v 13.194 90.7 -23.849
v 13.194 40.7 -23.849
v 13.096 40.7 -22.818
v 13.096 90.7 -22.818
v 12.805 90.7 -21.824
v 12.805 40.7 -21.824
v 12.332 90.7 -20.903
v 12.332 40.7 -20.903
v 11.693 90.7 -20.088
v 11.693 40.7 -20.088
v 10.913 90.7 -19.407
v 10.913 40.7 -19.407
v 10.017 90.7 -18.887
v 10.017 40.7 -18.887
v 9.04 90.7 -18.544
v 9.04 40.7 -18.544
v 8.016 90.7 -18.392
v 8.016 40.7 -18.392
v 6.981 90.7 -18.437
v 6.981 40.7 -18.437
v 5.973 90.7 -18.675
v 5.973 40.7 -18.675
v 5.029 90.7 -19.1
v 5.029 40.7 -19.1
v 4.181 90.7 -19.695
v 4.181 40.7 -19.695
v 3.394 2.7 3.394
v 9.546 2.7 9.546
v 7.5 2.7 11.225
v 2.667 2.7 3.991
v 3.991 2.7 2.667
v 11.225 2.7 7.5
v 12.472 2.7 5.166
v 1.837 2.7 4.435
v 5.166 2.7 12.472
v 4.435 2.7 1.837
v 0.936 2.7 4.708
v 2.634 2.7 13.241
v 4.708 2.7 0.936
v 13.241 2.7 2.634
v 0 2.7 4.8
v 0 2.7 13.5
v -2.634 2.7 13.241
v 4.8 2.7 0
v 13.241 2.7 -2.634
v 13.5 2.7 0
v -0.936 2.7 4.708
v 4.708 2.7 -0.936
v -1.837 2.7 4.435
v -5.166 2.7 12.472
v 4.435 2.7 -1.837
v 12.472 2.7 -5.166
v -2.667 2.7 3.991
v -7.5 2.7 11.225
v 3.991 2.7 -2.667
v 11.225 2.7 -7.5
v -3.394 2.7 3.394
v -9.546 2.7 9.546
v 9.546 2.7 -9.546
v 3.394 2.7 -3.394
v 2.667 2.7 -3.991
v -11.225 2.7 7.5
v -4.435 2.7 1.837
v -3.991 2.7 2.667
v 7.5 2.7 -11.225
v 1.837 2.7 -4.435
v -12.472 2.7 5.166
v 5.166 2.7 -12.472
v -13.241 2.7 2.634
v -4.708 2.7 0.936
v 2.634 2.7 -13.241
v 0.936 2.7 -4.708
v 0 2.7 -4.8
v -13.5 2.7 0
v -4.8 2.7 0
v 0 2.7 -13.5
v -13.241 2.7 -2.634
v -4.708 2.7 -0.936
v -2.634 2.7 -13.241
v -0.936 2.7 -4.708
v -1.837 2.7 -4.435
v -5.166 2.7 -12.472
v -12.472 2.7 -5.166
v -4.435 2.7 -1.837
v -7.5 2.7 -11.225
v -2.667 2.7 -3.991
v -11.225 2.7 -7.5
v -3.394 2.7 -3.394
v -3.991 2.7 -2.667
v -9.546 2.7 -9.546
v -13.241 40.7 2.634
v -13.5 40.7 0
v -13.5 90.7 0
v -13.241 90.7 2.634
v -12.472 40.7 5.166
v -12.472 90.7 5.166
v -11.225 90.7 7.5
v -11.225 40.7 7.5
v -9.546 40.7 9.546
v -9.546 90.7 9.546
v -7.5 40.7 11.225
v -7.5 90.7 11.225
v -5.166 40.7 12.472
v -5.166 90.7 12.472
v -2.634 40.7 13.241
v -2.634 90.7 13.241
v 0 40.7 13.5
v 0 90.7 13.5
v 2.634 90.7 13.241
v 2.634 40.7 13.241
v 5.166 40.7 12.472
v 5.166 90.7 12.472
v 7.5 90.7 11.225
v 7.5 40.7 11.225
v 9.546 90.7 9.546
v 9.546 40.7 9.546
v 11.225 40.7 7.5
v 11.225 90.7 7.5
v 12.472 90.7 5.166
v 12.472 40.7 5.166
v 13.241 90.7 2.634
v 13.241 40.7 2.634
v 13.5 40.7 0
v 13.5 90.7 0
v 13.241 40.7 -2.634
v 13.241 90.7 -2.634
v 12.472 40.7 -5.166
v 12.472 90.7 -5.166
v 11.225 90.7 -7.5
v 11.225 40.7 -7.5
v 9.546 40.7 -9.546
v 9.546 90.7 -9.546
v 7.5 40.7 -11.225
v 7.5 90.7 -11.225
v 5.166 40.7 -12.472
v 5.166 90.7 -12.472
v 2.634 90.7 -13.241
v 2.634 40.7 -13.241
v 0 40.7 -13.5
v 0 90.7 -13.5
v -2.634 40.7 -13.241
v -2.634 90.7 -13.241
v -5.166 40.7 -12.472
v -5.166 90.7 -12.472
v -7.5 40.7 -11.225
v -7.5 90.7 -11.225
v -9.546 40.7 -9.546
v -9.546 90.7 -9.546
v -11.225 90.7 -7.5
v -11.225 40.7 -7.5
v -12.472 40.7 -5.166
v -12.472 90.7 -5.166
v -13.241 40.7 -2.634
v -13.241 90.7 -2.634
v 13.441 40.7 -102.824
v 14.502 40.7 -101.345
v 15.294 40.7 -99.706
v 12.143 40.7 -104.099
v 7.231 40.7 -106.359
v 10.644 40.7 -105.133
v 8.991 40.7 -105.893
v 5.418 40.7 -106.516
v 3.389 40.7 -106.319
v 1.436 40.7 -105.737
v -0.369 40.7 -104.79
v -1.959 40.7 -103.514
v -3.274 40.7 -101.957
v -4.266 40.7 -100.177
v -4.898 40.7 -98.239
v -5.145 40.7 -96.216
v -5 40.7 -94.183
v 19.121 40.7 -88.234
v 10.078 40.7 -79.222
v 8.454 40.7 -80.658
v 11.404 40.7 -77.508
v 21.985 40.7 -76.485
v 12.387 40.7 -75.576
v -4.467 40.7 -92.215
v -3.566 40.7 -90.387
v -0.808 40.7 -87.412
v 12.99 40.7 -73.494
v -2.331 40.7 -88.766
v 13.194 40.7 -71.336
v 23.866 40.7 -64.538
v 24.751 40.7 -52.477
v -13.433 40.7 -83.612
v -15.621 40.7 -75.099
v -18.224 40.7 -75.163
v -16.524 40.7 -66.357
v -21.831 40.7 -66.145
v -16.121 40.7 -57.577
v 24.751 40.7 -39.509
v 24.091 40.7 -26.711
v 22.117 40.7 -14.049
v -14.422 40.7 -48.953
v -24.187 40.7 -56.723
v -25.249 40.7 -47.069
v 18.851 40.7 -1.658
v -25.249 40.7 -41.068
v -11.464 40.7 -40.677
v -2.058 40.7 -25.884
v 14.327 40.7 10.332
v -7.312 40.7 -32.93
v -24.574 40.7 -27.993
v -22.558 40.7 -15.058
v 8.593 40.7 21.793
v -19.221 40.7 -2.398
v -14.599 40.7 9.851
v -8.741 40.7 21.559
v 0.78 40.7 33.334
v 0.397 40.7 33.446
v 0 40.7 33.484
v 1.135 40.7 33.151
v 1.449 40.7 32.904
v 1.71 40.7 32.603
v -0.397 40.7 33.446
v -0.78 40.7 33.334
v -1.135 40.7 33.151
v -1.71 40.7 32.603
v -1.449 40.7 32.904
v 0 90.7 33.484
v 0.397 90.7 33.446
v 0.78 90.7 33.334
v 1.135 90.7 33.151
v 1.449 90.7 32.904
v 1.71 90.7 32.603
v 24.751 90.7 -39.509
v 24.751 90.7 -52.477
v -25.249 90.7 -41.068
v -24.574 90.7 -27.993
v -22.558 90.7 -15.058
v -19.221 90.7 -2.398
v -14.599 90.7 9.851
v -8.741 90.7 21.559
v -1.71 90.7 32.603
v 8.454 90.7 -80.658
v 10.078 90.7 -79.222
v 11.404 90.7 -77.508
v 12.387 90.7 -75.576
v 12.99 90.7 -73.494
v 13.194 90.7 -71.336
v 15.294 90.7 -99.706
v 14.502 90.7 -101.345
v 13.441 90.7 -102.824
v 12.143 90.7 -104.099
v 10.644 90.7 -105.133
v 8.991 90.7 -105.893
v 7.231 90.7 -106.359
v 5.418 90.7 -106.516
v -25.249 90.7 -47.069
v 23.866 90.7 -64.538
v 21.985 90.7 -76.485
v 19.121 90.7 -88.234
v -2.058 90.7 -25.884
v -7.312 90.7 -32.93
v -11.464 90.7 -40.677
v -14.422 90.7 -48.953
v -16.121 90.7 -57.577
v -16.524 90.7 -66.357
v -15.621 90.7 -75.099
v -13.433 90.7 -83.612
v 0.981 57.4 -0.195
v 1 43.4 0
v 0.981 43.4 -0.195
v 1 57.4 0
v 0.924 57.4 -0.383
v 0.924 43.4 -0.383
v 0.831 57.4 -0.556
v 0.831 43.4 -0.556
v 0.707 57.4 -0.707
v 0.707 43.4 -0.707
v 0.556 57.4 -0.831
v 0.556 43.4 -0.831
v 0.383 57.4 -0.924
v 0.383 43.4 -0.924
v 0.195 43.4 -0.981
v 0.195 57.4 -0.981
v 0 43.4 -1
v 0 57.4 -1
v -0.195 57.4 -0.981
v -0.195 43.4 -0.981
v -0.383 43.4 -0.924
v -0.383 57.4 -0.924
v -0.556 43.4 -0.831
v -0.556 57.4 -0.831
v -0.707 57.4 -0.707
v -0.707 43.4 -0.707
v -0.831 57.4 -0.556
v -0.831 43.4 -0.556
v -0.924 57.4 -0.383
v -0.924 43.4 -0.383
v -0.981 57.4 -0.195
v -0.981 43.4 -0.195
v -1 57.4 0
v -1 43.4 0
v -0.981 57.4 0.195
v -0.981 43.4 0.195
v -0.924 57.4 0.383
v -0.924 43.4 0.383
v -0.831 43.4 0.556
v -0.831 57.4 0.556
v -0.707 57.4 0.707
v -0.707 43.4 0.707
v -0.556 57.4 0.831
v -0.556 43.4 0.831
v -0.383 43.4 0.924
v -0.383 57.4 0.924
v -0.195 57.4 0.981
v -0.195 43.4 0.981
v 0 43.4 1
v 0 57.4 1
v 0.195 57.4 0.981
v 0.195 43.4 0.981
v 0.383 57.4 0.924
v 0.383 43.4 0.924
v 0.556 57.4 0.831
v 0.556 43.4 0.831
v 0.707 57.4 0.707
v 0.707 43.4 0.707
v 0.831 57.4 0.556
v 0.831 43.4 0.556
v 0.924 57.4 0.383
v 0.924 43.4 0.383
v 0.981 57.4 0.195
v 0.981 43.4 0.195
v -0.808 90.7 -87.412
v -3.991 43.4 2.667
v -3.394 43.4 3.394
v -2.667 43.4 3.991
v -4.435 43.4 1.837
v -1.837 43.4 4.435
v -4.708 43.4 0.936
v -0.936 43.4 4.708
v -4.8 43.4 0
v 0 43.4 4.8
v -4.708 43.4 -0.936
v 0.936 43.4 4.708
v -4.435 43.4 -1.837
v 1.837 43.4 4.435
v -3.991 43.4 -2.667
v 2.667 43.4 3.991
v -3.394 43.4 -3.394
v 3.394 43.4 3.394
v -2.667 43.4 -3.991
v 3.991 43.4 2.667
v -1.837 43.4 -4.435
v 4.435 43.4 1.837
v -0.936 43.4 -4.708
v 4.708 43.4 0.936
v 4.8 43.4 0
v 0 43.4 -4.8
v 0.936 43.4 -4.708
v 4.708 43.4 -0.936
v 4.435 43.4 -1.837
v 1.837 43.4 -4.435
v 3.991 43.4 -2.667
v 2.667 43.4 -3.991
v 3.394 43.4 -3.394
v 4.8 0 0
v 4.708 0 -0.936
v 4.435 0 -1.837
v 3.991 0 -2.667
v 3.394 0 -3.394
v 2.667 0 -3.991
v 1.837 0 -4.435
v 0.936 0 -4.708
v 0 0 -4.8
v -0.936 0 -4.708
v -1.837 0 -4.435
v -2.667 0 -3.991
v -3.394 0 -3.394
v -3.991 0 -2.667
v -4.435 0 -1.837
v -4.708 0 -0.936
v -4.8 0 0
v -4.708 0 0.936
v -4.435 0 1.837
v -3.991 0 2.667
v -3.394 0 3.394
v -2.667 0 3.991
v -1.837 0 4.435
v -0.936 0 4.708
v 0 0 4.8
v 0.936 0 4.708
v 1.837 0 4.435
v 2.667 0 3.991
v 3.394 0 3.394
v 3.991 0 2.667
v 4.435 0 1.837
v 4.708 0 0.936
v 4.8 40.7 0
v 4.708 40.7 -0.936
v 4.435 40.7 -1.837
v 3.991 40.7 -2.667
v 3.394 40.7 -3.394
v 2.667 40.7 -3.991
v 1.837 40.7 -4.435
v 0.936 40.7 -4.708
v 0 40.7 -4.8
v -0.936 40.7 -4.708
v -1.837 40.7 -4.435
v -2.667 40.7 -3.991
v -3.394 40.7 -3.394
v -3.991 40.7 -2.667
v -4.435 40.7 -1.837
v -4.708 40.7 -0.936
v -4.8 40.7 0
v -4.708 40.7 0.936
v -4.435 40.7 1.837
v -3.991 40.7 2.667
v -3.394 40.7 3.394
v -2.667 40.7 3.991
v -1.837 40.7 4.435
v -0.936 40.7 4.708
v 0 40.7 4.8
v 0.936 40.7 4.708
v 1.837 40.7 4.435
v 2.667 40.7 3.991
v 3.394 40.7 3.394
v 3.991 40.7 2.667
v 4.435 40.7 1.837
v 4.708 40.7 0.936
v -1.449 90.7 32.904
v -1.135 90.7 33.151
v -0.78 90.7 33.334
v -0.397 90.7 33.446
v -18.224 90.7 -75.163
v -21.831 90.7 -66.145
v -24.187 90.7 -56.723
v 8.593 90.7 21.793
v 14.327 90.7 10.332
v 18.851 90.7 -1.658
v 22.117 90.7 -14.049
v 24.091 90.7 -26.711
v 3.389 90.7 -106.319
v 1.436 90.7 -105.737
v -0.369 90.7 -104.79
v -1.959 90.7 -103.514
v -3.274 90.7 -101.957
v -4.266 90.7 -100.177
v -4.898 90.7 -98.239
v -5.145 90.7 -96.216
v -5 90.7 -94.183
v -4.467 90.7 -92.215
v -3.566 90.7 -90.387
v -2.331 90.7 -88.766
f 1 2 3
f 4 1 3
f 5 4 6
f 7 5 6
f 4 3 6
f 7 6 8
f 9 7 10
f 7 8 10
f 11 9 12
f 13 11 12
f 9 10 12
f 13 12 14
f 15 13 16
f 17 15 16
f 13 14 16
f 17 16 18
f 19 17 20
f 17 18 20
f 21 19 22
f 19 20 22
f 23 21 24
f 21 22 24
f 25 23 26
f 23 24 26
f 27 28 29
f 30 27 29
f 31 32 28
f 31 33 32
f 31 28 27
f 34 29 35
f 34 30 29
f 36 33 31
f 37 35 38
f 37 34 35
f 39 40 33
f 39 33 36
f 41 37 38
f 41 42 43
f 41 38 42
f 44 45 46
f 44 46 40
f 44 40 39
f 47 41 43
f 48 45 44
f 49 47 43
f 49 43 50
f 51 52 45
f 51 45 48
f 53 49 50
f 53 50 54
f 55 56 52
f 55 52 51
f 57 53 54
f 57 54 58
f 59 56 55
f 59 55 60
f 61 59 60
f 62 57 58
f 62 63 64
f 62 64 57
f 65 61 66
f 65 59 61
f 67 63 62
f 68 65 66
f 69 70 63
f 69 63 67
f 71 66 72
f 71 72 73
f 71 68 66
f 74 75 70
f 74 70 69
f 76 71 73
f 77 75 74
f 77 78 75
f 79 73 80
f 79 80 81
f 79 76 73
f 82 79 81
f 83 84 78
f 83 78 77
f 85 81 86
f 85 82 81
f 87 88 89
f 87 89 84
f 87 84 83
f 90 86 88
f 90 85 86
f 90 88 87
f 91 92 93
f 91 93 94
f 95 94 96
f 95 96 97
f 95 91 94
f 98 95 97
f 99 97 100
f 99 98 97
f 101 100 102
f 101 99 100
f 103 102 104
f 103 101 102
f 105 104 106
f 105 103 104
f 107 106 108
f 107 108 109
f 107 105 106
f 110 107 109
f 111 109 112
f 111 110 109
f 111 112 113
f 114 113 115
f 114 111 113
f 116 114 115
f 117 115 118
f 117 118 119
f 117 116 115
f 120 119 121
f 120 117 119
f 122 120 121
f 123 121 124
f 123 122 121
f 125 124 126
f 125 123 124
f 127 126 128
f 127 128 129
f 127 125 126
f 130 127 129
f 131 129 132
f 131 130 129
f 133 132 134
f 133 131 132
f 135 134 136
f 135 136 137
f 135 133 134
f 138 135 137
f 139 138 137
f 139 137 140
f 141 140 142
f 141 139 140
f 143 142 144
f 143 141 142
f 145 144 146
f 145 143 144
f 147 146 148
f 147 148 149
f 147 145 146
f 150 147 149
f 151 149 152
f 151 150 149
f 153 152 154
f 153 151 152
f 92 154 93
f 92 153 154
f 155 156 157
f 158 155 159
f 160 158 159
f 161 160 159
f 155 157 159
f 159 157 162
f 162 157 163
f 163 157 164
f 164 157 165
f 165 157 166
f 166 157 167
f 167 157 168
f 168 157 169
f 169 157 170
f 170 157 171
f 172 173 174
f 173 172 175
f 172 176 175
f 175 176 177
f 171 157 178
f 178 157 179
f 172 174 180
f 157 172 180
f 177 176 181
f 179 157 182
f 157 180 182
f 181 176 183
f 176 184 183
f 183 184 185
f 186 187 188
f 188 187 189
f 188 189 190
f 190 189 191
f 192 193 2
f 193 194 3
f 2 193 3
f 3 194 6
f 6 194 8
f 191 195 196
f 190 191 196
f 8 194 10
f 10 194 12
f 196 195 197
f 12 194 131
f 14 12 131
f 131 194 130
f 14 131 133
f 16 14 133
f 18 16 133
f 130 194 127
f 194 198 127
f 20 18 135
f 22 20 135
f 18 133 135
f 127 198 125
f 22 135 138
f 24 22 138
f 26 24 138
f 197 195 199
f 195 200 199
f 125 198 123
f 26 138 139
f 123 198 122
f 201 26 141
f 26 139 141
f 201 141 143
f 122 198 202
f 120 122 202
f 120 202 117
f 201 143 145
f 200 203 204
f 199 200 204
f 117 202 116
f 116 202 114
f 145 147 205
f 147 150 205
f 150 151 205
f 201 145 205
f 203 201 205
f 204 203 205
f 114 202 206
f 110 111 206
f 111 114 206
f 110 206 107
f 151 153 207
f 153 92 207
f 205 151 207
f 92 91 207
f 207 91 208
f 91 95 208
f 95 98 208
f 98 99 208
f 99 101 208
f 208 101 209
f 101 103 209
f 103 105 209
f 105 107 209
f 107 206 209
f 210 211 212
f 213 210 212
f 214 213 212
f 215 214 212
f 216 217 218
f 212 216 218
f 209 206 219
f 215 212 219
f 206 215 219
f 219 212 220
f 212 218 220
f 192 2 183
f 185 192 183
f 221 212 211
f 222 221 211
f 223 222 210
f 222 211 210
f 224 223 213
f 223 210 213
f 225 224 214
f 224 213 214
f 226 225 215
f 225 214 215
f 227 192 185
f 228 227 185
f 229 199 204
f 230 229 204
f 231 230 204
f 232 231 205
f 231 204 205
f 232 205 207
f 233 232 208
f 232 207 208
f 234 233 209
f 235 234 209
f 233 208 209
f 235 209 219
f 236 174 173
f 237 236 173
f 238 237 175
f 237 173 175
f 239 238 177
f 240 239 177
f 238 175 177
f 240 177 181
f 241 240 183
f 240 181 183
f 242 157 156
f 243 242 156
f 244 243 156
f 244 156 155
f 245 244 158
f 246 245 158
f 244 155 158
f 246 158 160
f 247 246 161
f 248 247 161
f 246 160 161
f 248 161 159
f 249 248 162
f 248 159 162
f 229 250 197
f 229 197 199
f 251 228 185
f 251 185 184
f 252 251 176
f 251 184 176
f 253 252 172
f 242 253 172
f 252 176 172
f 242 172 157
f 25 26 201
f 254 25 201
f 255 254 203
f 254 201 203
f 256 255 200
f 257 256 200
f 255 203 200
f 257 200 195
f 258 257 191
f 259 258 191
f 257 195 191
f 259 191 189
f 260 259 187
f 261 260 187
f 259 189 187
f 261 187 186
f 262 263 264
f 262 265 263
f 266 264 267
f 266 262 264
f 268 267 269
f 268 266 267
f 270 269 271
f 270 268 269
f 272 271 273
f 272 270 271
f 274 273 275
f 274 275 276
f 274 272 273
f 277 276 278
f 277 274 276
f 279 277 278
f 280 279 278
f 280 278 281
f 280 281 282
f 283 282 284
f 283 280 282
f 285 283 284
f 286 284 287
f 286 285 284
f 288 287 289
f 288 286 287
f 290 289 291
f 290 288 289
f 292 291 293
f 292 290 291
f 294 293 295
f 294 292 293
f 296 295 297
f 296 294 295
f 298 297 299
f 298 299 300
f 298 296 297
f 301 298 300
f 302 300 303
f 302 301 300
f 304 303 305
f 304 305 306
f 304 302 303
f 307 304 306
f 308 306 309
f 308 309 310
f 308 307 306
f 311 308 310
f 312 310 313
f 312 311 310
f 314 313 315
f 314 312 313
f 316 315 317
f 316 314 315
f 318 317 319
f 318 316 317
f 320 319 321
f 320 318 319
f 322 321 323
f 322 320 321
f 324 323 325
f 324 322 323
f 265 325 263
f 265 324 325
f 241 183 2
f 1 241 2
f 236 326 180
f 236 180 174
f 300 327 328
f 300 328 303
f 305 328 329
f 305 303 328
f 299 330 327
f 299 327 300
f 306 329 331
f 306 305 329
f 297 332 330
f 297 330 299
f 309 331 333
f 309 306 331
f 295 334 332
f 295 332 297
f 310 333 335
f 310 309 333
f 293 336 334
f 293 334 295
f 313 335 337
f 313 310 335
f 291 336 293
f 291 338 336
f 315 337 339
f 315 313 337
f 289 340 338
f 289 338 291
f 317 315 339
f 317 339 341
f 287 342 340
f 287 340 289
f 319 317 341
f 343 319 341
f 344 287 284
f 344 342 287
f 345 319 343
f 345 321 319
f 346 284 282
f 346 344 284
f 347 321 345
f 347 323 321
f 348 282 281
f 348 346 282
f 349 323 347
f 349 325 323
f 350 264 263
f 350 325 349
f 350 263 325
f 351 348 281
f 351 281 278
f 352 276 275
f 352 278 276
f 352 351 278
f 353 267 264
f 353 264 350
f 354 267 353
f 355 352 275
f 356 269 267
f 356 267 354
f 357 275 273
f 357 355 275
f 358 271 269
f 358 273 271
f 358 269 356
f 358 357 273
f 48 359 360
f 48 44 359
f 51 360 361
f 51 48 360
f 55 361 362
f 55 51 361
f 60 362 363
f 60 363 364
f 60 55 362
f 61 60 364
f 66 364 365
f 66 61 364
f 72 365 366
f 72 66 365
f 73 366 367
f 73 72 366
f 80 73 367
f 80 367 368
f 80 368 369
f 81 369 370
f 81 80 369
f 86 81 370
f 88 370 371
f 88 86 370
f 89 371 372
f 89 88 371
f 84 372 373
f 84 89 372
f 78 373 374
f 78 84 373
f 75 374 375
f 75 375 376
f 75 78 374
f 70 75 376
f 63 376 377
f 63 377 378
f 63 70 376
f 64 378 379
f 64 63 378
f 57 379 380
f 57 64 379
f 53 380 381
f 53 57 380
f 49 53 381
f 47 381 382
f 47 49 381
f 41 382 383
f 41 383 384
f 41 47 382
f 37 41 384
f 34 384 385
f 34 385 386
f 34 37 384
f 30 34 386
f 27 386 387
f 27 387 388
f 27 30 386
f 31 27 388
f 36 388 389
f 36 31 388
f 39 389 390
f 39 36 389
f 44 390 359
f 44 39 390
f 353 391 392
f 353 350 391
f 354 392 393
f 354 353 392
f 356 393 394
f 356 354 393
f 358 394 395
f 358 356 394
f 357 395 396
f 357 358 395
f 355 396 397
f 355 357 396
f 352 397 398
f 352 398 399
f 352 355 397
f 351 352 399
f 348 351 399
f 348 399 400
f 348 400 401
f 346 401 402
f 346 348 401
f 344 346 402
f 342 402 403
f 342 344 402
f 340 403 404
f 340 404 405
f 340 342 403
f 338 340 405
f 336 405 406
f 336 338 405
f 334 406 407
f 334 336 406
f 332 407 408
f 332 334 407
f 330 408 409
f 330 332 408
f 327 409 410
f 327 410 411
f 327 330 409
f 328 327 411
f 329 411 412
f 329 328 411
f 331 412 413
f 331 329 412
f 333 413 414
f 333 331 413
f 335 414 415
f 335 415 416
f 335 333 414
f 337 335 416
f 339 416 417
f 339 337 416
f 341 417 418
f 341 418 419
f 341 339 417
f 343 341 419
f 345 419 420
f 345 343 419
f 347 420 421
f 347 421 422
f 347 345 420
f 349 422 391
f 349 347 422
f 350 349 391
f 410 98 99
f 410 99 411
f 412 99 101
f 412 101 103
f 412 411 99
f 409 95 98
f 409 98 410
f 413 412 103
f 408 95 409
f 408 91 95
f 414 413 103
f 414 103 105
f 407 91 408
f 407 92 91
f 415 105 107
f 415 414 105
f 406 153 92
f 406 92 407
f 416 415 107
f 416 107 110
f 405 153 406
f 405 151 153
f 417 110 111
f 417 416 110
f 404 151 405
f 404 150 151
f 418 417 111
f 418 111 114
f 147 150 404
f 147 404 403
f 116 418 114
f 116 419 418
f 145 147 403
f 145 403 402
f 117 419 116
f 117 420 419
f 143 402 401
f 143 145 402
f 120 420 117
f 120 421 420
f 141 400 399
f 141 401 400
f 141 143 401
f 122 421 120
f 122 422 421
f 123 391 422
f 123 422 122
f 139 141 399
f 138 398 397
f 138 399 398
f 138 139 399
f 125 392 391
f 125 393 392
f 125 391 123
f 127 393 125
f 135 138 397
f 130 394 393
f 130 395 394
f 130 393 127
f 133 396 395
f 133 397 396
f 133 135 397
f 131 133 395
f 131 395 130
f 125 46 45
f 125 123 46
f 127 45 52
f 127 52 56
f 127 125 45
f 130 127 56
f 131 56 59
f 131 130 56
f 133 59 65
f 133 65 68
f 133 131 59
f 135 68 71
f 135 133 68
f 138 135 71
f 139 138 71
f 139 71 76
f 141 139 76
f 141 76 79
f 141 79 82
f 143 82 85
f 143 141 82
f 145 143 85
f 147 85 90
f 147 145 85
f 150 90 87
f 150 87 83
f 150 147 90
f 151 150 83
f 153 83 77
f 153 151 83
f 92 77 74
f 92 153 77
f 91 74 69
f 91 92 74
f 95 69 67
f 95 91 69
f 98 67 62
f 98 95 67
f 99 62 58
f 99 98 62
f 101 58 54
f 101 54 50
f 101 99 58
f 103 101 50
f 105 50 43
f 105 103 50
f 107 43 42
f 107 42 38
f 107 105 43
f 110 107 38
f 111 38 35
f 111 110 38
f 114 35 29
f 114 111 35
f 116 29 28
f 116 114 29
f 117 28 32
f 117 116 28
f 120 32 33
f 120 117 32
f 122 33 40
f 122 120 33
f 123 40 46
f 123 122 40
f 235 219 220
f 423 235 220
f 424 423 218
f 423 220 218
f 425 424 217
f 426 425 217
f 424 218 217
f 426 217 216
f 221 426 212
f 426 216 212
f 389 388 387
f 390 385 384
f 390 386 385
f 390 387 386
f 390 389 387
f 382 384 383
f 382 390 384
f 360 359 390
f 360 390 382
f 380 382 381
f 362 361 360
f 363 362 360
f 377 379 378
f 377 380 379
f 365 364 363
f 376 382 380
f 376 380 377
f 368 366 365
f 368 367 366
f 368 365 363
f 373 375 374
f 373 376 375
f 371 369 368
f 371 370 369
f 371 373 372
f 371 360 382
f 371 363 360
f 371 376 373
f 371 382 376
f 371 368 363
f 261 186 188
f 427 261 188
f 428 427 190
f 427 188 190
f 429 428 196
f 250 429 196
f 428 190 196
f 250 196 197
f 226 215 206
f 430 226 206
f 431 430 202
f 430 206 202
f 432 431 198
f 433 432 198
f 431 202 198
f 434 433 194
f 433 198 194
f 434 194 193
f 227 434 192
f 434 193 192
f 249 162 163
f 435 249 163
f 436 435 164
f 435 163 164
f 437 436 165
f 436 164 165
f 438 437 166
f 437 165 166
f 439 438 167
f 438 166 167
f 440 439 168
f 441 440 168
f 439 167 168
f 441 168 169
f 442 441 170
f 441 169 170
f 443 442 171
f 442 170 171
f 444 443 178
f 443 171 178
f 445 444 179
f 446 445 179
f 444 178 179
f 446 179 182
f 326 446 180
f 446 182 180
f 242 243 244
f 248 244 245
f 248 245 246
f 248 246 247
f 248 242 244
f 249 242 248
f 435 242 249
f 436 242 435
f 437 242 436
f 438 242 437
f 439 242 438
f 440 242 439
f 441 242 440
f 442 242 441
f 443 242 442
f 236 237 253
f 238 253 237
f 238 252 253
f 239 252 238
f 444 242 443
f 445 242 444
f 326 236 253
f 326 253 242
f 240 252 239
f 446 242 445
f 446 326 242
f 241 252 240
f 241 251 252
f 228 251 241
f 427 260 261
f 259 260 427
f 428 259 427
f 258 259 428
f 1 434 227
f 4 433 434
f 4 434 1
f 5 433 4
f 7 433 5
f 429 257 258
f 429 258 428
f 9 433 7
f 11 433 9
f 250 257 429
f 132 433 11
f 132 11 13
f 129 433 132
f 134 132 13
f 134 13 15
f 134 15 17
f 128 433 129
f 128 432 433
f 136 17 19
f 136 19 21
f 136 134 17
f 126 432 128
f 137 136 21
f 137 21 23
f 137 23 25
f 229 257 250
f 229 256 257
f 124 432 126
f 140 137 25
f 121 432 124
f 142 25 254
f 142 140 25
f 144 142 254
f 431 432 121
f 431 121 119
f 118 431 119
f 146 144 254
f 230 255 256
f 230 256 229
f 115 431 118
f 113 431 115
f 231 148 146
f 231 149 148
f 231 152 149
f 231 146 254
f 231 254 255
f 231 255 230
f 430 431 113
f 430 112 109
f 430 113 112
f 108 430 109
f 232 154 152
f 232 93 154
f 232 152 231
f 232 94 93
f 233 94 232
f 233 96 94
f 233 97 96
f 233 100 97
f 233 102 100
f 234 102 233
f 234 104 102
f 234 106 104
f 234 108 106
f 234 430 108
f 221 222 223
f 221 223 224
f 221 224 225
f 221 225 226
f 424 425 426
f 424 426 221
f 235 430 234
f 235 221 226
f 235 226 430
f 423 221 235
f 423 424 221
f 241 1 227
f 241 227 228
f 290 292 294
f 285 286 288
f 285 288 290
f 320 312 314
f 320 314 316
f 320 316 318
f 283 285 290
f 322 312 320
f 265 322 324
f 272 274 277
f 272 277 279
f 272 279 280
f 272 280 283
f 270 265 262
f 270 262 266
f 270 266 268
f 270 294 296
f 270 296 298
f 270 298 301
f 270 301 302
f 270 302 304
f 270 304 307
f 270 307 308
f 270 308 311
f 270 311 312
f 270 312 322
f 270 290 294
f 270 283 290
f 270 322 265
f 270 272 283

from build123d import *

# Parameters (mm, degrees)
F2_R     = 13.5
F3_DEPTH = 50


with BuildPart() as f1:
    # F0 (on Top) → F1 (revolve)
    with BuildSketch(Plane.XY):
        Polygon((0, 57.4), (0, 0), (4.8, 0), (4.8, 2.7), (13.5, 2.7), (13.5, 40.7), (4.8, 40.7), (4.8, 43.4), (1, 43.4), (1, 57.4), align=None)
    revolve(axis=Axis((0, 28.7, 0), (0, 1, 0)))


with BuildPart() as f3:
    # F2 (on face) → F3 (new body)
    with BuildSketch(Plane(origin=(0, 40.7, 0), x_dir=(-1, 0, 0), z_dir=(0, 1, 0))):
        with BuildLine():
            ThreePointArc((-15.293559, -99.706312), (-11.415618, -104.648306), (-5.417719, -106.51564))
            ThreePointArc((-5.417719, -106.51564), (4.62865, -99.223106), (0.807667, -87.411643))
            Line((0.807667, -87.411643), (-8.454187, -80.658207))
            ThreePointArc((-8.454187, -80.658207), (-11.941093, -76.564912), (-13.194118, -71.33581))
            Line((-13.194118, -71.33581), (-13.194118, -23.848685))
            ThreePointArc((-13.194118, -23.848685), (-10.017441, -18.886677), (-4.181347, -19.694644))
            ThreePointArc((-4.181347, -19.694644), (14.421882, -48.953481), (13.432901, -83.611548))
            ThreePointArc((13.432901, -83.611548), (21.831155, -66.145248), (25.24896, -47.068537))
            Line((25.24896, -47.068537), (25.24896, -41.067817))
            ThreePointArc((25.24896, -41.067817), (19.221185, -2.39799), (1.709815, 32.602604))
            ThreePointArc((1.709815, 32.602604), (0.961894, 33.25094), (0, 33.48436))
            ThreePointArc((0, 33.48436), (-0.961894, 33.25094), (-1.709815, 32.602604))
            ThreePointArc((-1.709815, 32.602604), (-18.85077, -1.657629), (-24.75104, -39.50948))
            Line((-24.75104, -39.50948), (-24.75104, -52.477009))
            ThreePointArc((-24.75104, -52.477009), (-21.985457, -76.484775), (-15.293559, -99.706312))
        make_face()
        Circle(F2_R, mode=Mode.SUBTRACT)
    extrude(amount=F3_DEPTH)


solid = Compound([f1.part, f3.part])
